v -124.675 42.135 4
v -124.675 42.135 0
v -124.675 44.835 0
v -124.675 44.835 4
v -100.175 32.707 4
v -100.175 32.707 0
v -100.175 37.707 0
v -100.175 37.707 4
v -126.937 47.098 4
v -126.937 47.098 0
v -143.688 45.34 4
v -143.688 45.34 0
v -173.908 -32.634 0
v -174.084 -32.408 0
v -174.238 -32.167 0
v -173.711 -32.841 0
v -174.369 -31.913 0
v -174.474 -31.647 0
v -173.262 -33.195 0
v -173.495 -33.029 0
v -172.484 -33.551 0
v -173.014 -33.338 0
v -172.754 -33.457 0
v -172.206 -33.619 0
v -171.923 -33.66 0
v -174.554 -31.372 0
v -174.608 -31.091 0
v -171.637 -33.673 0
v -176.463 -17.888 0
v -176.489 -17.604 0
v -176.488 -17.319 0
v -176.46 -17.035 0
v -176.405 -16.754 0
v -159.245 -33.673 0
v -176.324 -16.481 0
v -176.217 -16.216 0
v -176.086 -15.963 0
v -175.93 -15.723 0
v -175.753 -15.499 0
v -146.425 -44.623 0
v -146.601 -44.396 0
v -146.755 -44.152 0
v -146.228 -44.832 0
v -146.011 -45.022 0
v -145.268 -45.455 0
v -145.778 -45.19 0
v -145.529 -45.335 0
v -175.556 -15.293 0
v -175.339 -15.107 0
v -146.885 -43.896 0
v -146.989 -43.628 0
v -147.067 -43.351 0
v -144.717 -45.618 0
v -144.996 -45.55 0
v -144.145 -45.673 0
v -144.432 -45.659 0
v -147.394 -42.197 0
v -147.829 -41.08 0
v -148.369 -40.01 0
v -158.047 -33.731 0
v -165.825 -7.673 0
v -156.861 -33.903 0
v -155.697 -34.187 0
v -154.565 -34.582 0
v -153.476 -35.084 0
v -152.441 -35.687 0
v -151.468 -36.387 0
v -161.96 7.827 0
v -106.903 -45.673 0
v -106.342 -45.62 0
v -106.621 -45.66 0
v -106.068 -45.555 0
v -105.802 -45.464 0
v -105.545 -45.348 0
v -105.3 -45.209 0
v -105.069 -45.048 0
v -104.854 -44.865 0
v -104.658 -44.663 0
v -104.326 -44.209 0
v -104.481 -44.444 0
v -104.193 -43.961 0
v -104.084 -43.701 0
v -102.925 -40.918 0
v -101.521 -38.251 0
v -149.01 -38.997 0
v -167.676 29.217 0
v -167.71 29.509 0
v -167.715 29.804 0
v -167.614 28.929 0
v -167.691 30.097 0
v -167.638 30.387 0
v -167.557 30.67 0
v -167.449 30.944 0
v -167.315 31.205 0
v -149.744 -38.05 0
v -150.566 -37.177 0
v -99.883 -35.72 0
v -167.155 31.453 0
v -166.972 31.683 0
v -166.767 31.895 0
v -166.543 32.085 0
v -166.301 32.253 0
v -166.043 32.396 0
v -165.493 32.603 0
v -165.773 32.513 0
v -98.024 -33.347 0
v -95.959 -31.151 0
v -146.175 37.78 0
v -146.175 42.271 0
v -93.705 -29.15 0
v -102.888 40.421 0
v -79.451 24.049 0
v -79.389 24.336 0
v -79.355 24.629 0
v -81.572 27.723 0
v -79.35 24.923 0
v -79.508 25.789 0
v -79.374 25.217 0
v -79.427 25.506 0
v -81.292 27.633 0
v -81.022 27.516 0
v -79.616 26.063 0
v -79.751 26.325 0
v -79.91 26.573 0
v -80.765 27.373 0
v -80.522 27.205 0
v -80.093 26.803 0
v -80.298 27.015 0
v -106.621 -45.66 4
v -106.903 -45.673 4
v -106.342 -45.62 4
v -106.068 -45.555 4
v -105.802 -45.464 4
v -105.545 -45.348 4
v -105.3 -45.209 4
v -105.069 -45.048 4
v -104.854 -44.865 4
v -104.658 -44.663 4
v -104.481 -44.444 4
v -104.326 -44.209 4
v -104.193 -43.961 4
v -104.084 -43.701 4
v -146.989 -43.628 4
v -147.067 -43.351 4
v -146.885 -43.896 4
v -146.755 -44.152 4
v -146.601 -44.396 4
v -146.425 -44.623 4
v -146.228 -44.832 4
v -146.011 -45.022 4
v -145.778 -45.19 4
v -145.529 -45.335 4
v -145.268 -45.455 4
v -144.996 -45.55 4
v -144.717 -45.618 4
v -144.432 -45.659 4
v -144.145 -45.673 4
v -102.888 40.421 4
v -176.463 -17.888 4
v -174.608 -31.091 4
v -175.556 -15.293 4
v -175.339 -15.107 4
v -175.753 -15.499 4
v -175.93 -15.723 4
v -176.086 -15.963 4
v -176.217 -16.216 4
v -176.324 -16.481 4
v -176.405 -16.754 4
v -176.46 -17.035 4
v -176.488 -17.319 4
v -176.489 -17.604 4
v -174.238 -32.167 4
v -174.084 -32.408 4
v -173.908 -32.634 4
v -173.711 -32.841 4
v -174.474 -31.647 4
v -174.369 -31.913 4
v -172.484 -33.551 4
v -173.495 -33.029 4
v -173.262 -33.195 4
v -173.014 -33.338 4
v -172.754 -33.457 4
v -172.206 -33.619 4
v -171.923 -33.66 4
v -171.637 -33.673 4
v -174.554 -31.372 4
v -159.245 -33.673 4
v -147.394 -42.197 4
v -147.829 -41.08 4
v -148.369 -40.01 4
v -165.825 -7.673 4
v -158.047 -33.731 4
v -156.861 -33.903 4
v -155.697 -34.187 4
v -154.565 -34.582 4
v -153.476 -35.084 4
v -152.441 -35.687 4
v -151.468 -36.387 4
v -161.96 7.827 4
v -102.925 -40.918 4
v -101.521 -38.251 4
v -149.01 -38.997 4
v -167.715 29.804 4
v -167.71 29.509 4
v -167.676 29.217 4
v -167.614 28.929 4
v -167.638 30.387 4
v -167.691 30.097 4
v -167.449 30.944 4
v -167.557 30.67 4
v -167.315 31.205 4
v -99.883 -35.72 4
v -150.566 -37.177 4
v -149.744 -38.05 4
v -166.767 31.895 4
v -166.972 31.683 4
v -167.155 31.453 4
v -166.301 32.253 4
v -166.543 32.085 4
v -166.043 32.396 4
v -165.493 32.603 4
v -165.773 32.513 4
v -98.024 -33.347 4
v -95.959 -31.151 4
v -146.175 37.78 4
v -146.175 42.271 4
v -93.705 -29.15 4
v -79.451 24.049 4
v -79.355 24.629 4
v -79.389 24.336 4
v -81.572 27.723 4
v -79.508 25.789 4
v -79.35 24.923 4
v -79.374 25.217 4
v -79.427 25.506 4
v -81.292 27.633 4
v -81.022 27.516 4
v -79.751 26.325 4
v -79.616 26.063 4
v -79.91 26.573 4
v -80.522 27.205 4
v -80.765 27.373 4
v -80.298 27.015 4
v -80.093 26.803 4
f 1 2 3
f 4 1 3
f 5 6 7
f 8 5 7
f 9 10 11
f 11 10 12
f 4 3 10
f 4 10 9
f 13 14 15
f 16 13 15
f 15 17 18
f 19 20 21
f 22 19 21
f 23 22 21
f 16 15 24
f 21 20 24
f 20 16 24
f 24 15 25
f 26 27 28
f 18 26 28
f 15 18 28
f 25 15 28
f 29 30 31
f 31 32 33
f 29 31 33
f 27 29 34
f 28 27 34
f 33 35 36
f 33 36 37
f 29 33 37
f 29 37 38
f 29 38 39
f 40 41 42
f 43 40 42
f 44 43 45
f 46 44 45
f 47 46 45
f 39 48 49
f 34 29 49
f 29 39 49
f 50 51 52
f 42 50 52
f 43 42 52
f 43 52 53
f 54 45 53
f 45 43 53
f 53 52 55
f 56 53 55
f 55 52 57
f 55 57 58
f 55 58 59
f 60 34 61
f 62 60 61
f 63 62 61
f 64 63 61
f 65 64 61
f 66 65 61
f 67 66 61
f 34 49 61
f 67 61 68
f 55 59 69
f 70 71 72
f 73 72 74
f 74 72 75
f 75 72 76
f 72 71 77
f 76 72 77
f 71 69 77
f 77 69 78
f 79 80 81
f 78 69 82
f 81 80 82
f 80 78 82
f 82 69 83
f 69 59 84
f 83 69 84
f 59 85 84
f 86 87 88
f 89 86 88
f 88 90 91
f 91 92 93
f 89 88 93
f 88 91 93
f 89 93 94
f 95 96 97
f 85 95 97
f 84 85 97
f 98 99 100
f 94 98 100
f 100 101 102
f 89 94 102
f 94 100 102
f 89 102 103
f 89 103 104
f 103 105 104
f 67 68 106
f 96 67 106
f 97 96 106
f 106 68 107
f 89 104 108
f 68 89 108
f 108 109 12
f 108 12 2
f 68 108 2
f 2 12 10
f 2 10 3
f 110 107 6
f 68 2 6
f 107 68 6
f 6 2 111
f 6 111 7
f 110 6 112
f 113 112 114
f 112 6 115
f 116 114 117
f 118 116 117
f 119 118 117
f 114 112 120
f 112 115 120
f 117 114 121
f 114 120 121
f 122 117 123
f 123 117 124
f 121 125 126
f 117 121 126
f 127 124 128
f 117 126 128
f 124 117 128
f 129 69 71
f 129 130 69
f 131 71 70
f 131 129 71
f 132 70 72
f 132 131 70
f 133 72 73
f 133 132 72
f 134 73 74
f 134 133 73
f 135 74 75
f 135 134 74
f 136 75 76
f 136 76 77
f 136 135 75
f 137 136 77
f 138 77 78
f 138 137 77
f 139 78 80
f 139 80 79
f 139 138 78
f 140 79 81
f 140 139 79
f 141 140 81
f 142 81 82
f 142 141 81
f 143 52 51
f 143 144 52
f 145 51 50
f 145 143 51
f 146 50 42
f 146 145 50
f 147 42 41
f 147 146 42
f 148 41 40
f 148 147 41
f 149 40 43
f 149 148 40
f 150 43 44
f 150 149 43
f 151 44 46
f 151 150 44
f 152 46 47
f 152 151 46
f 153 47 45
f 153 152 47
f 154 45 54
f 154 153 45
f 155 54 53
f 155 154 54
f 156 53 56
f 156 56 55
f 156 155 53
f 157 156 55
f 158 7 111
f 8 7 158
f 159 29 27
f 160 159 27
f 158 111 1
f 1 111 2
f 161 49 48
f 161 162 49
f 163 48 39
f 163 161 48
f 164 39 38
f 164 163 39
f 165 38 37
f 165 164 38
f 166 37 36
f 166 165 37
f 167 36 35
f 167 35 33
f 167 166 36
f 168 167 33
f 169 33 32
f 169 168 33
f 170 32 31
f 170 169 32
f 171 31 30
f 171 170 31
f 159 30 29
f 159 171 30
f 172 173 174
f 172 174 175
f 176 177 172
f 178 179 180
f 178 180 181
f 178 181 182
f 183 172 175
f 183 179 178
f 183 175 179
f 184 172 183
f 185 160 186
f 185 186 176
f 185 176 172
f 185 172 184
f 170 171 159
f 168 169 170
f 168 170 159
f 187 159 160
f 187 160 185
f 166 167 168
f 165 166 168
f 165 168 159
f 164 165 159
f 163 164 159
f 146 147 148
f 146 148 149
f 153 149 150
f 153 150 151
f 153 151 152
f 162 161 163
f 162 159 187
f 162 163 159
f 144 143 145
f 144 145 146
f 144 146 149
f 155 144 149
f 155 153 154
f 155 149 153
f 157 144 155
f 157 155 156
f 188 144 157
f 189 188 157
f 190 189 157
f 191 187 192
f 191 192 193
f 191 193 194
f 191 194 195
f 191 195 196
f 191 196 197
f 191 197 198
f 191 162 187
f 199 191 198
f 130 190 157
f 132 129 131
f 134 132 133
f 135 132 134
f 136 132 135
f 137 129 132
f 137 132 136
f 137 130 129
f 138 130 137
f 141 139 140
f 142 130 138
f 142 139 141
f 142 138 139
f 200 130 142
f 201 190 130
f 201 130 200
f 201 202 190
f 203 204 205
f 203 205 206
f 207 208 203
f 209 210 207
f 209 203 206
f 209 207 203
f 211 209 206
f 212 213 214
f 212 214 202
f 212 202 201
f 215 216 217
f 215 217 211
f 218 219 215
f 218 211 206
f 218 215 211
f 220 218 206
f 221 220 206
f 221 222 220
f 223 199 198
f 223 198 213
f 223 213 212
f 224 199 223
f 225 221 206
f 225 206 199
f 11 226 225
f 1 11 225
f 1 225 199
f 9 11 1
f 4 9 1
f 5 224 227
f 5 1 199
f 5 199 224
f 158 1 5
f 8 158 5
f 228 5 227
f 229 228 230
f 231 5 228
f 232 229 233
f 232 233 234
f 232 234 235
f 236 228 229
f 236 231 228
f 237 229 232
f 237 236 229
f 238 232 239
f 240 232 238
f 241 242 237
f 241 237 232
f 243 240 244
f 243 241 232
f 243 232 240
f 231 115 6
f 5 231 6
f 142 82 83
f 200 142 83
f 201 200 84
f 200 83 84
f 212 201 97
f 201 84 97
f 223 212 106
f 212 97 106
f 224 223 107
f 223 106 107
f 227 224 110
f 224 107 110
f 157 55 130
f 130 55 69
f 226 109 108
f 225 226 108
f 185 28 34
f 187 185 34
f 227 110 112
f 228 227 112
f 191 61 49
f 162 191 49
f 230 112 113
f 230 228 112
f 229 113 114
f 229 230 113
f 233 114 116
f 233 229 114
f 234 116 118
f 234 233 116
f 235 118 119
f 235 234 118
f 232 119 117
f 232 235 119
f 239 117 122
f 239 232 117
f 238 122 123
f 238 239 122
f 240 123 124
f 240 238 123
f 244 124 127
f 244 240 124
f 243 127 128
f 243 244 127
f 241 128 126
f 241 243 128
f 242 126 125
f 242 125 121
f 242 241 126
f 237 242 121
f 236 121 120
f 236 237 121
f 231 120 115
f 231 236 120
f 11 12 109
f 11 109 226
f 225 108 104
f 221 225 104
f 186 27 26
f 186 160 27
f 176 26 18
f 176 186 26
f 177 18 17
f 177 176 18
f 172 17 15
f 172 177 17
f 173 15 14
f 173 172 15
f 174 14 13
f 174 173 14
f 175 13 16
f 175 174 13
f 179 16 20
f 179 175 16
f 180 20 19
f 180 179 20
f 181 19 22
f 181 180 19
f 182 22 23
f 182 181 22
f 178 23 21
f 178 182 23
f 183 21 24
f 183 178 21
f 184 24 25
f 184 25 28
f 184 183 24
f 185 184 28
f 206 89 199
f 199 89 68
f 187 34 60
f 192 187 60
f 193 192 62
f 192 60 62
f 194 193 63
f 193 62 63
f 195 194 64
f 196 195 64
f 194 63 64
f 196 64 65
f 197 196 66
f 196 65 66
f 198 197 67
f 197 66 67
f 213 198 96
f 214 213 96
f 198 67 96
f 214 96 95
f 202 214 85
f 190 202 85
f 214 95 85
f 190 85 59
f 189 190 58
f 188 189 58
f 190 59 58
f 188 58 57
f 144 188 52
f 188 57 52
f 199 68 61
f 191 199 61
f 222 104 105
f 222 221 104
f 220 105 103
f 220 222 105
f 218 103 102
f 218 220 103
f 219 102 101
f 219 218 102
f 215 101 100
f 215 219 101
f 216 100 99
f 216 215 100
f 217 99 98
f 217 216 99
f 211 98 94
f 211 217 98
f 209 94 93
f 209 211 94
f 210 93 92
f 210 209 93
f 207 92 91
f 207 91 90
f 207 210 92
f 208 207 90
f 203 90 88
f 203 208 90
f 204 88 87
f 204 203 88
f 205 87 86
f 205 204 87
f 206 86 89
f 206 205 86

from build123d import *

# Parameters (mm, degrees)
BOSS_EXTRUDE2_DEPTH   = 4
FILLET3_R             = 3
CHAMFER1_SIZE2        = 2.5
CHAMFER1_SIZE         = 2.808402332
CHAMFER1_EDGE_2_SIZE2 = 2.5
CHAMFER1_EDGE_2_SIZE  = 2.275013623
CHAMFER1_EDGE_3_SIZE2 = 2.5
CHAMFER1_EDGE_3_SIZE  = 2.72195283


with BuildPart() as part:
    # Sketch1 → Boss-Extrude2 (new body)
    with BuildSketch(Plane.XY):
        with BuildLine():
            ThreePointArc((-159.244638184, -33.673282531), (-150.584384146, -37.159404343), (-146.754642187, -45.673282531))
            Line((-146.754642187, -45.673282531), (-104.73463418, -45.673282531))
            ThreePointArc((-104.73463418, -45.673282531), (-100.473058927, -36.575080639), (-93.705391257, -29.149653001))
            Line((-93.705391257, -29.149653001), (-78.674501487, 26.946391303))
            Line((-78.674501487, 26.946391303), (-100.174501487, 32.70729894))
            Line((-100.174501487, 32.70729894), (-100.174501487, 40.20729894))
            Line((-100.174501487, 40.20729894), (-124.674501487, 42.135490757))
            Line((-124.674501487, 42.135490757), (-124.674501487, 47.335490757))
            Line((-124.674501487, 47.335490757), (-146.174501487, 45.079555506))
            Line((-146.174501487, 45.079555506), (-146.174501487, 37.779555506))
            Line((-146.174501487, 37.779555506), (-168.390795492, 31.826717469))
            Line((-168.390795492, 31.826717469), (-161.960014873, 7.826717469))
            Line((-161.960014873, 7.826717469), (-165.824598917, -7.673282531))
            Line((-165.824598917, -7.673282531), (-176.704102791, -16.173282531))
            Line((-176.704102791, -16.173282531), (-174.244638184, -33.673282531))
            Line((-174.244638184, -33.673282531), (-159.244638184, -33.673282531))
        make_face()
    extrude(amount=BOSS_EXTRUDE2_DEPTH)

    # Fillet3
    fillet3_edges = [part.edges().sort_by_distance(p)[0] for p in [
        (-104.73463418, -45.673282531, 2),
        (-146.754642187, -45.673282531, 2),
        (-174.244638184, -33.673282531, 2),
        (-176.704102791, -16.173282531, 2),
        (-168.390795492, 31.826717469, 2),
        (-78.674501487, 26.946391303, 2),
    ]]
    fillet(fillet3_edges, radius=FILLET3_R)

    # Chamfer1
    chamfer1_edges = [part.edges().sort_by_distance(p)[0] for p in [
        (-146.174501487, 45.079555506, 2),
    ]]
    chamfer(chamfer1_edges, length=CHAMFER1_SIZE, length2=CHAMFER1_SIZE2)

    # Chamfer1 edge 2
    chamfer1_edge_2_edges = [part.edges().sort_by_distance(p)[0] for p in [
        (-124.674501487, 47.335490757, 2),
    ]]
    chamfer(chamfer1_edge_2_edges, length=CHAMFER1_EDGE_2_SIZE, length2=CHAMFER1_EDGE_2_SIZE2)

    # Chamfer1 edge 3
    chamfer1_edge_3_edges = [part.edges().sort_by_distance(p)[0] for p in [
        (-100.174501487, 40.20729894, 2),
    ]]
    chamfer(chamfer1_edge_3_edges, length=CHAMFER1_EDGE_3_SIZE, length2=CHAMFER1_EDGE_3_SIZE2)


solid = part.part
